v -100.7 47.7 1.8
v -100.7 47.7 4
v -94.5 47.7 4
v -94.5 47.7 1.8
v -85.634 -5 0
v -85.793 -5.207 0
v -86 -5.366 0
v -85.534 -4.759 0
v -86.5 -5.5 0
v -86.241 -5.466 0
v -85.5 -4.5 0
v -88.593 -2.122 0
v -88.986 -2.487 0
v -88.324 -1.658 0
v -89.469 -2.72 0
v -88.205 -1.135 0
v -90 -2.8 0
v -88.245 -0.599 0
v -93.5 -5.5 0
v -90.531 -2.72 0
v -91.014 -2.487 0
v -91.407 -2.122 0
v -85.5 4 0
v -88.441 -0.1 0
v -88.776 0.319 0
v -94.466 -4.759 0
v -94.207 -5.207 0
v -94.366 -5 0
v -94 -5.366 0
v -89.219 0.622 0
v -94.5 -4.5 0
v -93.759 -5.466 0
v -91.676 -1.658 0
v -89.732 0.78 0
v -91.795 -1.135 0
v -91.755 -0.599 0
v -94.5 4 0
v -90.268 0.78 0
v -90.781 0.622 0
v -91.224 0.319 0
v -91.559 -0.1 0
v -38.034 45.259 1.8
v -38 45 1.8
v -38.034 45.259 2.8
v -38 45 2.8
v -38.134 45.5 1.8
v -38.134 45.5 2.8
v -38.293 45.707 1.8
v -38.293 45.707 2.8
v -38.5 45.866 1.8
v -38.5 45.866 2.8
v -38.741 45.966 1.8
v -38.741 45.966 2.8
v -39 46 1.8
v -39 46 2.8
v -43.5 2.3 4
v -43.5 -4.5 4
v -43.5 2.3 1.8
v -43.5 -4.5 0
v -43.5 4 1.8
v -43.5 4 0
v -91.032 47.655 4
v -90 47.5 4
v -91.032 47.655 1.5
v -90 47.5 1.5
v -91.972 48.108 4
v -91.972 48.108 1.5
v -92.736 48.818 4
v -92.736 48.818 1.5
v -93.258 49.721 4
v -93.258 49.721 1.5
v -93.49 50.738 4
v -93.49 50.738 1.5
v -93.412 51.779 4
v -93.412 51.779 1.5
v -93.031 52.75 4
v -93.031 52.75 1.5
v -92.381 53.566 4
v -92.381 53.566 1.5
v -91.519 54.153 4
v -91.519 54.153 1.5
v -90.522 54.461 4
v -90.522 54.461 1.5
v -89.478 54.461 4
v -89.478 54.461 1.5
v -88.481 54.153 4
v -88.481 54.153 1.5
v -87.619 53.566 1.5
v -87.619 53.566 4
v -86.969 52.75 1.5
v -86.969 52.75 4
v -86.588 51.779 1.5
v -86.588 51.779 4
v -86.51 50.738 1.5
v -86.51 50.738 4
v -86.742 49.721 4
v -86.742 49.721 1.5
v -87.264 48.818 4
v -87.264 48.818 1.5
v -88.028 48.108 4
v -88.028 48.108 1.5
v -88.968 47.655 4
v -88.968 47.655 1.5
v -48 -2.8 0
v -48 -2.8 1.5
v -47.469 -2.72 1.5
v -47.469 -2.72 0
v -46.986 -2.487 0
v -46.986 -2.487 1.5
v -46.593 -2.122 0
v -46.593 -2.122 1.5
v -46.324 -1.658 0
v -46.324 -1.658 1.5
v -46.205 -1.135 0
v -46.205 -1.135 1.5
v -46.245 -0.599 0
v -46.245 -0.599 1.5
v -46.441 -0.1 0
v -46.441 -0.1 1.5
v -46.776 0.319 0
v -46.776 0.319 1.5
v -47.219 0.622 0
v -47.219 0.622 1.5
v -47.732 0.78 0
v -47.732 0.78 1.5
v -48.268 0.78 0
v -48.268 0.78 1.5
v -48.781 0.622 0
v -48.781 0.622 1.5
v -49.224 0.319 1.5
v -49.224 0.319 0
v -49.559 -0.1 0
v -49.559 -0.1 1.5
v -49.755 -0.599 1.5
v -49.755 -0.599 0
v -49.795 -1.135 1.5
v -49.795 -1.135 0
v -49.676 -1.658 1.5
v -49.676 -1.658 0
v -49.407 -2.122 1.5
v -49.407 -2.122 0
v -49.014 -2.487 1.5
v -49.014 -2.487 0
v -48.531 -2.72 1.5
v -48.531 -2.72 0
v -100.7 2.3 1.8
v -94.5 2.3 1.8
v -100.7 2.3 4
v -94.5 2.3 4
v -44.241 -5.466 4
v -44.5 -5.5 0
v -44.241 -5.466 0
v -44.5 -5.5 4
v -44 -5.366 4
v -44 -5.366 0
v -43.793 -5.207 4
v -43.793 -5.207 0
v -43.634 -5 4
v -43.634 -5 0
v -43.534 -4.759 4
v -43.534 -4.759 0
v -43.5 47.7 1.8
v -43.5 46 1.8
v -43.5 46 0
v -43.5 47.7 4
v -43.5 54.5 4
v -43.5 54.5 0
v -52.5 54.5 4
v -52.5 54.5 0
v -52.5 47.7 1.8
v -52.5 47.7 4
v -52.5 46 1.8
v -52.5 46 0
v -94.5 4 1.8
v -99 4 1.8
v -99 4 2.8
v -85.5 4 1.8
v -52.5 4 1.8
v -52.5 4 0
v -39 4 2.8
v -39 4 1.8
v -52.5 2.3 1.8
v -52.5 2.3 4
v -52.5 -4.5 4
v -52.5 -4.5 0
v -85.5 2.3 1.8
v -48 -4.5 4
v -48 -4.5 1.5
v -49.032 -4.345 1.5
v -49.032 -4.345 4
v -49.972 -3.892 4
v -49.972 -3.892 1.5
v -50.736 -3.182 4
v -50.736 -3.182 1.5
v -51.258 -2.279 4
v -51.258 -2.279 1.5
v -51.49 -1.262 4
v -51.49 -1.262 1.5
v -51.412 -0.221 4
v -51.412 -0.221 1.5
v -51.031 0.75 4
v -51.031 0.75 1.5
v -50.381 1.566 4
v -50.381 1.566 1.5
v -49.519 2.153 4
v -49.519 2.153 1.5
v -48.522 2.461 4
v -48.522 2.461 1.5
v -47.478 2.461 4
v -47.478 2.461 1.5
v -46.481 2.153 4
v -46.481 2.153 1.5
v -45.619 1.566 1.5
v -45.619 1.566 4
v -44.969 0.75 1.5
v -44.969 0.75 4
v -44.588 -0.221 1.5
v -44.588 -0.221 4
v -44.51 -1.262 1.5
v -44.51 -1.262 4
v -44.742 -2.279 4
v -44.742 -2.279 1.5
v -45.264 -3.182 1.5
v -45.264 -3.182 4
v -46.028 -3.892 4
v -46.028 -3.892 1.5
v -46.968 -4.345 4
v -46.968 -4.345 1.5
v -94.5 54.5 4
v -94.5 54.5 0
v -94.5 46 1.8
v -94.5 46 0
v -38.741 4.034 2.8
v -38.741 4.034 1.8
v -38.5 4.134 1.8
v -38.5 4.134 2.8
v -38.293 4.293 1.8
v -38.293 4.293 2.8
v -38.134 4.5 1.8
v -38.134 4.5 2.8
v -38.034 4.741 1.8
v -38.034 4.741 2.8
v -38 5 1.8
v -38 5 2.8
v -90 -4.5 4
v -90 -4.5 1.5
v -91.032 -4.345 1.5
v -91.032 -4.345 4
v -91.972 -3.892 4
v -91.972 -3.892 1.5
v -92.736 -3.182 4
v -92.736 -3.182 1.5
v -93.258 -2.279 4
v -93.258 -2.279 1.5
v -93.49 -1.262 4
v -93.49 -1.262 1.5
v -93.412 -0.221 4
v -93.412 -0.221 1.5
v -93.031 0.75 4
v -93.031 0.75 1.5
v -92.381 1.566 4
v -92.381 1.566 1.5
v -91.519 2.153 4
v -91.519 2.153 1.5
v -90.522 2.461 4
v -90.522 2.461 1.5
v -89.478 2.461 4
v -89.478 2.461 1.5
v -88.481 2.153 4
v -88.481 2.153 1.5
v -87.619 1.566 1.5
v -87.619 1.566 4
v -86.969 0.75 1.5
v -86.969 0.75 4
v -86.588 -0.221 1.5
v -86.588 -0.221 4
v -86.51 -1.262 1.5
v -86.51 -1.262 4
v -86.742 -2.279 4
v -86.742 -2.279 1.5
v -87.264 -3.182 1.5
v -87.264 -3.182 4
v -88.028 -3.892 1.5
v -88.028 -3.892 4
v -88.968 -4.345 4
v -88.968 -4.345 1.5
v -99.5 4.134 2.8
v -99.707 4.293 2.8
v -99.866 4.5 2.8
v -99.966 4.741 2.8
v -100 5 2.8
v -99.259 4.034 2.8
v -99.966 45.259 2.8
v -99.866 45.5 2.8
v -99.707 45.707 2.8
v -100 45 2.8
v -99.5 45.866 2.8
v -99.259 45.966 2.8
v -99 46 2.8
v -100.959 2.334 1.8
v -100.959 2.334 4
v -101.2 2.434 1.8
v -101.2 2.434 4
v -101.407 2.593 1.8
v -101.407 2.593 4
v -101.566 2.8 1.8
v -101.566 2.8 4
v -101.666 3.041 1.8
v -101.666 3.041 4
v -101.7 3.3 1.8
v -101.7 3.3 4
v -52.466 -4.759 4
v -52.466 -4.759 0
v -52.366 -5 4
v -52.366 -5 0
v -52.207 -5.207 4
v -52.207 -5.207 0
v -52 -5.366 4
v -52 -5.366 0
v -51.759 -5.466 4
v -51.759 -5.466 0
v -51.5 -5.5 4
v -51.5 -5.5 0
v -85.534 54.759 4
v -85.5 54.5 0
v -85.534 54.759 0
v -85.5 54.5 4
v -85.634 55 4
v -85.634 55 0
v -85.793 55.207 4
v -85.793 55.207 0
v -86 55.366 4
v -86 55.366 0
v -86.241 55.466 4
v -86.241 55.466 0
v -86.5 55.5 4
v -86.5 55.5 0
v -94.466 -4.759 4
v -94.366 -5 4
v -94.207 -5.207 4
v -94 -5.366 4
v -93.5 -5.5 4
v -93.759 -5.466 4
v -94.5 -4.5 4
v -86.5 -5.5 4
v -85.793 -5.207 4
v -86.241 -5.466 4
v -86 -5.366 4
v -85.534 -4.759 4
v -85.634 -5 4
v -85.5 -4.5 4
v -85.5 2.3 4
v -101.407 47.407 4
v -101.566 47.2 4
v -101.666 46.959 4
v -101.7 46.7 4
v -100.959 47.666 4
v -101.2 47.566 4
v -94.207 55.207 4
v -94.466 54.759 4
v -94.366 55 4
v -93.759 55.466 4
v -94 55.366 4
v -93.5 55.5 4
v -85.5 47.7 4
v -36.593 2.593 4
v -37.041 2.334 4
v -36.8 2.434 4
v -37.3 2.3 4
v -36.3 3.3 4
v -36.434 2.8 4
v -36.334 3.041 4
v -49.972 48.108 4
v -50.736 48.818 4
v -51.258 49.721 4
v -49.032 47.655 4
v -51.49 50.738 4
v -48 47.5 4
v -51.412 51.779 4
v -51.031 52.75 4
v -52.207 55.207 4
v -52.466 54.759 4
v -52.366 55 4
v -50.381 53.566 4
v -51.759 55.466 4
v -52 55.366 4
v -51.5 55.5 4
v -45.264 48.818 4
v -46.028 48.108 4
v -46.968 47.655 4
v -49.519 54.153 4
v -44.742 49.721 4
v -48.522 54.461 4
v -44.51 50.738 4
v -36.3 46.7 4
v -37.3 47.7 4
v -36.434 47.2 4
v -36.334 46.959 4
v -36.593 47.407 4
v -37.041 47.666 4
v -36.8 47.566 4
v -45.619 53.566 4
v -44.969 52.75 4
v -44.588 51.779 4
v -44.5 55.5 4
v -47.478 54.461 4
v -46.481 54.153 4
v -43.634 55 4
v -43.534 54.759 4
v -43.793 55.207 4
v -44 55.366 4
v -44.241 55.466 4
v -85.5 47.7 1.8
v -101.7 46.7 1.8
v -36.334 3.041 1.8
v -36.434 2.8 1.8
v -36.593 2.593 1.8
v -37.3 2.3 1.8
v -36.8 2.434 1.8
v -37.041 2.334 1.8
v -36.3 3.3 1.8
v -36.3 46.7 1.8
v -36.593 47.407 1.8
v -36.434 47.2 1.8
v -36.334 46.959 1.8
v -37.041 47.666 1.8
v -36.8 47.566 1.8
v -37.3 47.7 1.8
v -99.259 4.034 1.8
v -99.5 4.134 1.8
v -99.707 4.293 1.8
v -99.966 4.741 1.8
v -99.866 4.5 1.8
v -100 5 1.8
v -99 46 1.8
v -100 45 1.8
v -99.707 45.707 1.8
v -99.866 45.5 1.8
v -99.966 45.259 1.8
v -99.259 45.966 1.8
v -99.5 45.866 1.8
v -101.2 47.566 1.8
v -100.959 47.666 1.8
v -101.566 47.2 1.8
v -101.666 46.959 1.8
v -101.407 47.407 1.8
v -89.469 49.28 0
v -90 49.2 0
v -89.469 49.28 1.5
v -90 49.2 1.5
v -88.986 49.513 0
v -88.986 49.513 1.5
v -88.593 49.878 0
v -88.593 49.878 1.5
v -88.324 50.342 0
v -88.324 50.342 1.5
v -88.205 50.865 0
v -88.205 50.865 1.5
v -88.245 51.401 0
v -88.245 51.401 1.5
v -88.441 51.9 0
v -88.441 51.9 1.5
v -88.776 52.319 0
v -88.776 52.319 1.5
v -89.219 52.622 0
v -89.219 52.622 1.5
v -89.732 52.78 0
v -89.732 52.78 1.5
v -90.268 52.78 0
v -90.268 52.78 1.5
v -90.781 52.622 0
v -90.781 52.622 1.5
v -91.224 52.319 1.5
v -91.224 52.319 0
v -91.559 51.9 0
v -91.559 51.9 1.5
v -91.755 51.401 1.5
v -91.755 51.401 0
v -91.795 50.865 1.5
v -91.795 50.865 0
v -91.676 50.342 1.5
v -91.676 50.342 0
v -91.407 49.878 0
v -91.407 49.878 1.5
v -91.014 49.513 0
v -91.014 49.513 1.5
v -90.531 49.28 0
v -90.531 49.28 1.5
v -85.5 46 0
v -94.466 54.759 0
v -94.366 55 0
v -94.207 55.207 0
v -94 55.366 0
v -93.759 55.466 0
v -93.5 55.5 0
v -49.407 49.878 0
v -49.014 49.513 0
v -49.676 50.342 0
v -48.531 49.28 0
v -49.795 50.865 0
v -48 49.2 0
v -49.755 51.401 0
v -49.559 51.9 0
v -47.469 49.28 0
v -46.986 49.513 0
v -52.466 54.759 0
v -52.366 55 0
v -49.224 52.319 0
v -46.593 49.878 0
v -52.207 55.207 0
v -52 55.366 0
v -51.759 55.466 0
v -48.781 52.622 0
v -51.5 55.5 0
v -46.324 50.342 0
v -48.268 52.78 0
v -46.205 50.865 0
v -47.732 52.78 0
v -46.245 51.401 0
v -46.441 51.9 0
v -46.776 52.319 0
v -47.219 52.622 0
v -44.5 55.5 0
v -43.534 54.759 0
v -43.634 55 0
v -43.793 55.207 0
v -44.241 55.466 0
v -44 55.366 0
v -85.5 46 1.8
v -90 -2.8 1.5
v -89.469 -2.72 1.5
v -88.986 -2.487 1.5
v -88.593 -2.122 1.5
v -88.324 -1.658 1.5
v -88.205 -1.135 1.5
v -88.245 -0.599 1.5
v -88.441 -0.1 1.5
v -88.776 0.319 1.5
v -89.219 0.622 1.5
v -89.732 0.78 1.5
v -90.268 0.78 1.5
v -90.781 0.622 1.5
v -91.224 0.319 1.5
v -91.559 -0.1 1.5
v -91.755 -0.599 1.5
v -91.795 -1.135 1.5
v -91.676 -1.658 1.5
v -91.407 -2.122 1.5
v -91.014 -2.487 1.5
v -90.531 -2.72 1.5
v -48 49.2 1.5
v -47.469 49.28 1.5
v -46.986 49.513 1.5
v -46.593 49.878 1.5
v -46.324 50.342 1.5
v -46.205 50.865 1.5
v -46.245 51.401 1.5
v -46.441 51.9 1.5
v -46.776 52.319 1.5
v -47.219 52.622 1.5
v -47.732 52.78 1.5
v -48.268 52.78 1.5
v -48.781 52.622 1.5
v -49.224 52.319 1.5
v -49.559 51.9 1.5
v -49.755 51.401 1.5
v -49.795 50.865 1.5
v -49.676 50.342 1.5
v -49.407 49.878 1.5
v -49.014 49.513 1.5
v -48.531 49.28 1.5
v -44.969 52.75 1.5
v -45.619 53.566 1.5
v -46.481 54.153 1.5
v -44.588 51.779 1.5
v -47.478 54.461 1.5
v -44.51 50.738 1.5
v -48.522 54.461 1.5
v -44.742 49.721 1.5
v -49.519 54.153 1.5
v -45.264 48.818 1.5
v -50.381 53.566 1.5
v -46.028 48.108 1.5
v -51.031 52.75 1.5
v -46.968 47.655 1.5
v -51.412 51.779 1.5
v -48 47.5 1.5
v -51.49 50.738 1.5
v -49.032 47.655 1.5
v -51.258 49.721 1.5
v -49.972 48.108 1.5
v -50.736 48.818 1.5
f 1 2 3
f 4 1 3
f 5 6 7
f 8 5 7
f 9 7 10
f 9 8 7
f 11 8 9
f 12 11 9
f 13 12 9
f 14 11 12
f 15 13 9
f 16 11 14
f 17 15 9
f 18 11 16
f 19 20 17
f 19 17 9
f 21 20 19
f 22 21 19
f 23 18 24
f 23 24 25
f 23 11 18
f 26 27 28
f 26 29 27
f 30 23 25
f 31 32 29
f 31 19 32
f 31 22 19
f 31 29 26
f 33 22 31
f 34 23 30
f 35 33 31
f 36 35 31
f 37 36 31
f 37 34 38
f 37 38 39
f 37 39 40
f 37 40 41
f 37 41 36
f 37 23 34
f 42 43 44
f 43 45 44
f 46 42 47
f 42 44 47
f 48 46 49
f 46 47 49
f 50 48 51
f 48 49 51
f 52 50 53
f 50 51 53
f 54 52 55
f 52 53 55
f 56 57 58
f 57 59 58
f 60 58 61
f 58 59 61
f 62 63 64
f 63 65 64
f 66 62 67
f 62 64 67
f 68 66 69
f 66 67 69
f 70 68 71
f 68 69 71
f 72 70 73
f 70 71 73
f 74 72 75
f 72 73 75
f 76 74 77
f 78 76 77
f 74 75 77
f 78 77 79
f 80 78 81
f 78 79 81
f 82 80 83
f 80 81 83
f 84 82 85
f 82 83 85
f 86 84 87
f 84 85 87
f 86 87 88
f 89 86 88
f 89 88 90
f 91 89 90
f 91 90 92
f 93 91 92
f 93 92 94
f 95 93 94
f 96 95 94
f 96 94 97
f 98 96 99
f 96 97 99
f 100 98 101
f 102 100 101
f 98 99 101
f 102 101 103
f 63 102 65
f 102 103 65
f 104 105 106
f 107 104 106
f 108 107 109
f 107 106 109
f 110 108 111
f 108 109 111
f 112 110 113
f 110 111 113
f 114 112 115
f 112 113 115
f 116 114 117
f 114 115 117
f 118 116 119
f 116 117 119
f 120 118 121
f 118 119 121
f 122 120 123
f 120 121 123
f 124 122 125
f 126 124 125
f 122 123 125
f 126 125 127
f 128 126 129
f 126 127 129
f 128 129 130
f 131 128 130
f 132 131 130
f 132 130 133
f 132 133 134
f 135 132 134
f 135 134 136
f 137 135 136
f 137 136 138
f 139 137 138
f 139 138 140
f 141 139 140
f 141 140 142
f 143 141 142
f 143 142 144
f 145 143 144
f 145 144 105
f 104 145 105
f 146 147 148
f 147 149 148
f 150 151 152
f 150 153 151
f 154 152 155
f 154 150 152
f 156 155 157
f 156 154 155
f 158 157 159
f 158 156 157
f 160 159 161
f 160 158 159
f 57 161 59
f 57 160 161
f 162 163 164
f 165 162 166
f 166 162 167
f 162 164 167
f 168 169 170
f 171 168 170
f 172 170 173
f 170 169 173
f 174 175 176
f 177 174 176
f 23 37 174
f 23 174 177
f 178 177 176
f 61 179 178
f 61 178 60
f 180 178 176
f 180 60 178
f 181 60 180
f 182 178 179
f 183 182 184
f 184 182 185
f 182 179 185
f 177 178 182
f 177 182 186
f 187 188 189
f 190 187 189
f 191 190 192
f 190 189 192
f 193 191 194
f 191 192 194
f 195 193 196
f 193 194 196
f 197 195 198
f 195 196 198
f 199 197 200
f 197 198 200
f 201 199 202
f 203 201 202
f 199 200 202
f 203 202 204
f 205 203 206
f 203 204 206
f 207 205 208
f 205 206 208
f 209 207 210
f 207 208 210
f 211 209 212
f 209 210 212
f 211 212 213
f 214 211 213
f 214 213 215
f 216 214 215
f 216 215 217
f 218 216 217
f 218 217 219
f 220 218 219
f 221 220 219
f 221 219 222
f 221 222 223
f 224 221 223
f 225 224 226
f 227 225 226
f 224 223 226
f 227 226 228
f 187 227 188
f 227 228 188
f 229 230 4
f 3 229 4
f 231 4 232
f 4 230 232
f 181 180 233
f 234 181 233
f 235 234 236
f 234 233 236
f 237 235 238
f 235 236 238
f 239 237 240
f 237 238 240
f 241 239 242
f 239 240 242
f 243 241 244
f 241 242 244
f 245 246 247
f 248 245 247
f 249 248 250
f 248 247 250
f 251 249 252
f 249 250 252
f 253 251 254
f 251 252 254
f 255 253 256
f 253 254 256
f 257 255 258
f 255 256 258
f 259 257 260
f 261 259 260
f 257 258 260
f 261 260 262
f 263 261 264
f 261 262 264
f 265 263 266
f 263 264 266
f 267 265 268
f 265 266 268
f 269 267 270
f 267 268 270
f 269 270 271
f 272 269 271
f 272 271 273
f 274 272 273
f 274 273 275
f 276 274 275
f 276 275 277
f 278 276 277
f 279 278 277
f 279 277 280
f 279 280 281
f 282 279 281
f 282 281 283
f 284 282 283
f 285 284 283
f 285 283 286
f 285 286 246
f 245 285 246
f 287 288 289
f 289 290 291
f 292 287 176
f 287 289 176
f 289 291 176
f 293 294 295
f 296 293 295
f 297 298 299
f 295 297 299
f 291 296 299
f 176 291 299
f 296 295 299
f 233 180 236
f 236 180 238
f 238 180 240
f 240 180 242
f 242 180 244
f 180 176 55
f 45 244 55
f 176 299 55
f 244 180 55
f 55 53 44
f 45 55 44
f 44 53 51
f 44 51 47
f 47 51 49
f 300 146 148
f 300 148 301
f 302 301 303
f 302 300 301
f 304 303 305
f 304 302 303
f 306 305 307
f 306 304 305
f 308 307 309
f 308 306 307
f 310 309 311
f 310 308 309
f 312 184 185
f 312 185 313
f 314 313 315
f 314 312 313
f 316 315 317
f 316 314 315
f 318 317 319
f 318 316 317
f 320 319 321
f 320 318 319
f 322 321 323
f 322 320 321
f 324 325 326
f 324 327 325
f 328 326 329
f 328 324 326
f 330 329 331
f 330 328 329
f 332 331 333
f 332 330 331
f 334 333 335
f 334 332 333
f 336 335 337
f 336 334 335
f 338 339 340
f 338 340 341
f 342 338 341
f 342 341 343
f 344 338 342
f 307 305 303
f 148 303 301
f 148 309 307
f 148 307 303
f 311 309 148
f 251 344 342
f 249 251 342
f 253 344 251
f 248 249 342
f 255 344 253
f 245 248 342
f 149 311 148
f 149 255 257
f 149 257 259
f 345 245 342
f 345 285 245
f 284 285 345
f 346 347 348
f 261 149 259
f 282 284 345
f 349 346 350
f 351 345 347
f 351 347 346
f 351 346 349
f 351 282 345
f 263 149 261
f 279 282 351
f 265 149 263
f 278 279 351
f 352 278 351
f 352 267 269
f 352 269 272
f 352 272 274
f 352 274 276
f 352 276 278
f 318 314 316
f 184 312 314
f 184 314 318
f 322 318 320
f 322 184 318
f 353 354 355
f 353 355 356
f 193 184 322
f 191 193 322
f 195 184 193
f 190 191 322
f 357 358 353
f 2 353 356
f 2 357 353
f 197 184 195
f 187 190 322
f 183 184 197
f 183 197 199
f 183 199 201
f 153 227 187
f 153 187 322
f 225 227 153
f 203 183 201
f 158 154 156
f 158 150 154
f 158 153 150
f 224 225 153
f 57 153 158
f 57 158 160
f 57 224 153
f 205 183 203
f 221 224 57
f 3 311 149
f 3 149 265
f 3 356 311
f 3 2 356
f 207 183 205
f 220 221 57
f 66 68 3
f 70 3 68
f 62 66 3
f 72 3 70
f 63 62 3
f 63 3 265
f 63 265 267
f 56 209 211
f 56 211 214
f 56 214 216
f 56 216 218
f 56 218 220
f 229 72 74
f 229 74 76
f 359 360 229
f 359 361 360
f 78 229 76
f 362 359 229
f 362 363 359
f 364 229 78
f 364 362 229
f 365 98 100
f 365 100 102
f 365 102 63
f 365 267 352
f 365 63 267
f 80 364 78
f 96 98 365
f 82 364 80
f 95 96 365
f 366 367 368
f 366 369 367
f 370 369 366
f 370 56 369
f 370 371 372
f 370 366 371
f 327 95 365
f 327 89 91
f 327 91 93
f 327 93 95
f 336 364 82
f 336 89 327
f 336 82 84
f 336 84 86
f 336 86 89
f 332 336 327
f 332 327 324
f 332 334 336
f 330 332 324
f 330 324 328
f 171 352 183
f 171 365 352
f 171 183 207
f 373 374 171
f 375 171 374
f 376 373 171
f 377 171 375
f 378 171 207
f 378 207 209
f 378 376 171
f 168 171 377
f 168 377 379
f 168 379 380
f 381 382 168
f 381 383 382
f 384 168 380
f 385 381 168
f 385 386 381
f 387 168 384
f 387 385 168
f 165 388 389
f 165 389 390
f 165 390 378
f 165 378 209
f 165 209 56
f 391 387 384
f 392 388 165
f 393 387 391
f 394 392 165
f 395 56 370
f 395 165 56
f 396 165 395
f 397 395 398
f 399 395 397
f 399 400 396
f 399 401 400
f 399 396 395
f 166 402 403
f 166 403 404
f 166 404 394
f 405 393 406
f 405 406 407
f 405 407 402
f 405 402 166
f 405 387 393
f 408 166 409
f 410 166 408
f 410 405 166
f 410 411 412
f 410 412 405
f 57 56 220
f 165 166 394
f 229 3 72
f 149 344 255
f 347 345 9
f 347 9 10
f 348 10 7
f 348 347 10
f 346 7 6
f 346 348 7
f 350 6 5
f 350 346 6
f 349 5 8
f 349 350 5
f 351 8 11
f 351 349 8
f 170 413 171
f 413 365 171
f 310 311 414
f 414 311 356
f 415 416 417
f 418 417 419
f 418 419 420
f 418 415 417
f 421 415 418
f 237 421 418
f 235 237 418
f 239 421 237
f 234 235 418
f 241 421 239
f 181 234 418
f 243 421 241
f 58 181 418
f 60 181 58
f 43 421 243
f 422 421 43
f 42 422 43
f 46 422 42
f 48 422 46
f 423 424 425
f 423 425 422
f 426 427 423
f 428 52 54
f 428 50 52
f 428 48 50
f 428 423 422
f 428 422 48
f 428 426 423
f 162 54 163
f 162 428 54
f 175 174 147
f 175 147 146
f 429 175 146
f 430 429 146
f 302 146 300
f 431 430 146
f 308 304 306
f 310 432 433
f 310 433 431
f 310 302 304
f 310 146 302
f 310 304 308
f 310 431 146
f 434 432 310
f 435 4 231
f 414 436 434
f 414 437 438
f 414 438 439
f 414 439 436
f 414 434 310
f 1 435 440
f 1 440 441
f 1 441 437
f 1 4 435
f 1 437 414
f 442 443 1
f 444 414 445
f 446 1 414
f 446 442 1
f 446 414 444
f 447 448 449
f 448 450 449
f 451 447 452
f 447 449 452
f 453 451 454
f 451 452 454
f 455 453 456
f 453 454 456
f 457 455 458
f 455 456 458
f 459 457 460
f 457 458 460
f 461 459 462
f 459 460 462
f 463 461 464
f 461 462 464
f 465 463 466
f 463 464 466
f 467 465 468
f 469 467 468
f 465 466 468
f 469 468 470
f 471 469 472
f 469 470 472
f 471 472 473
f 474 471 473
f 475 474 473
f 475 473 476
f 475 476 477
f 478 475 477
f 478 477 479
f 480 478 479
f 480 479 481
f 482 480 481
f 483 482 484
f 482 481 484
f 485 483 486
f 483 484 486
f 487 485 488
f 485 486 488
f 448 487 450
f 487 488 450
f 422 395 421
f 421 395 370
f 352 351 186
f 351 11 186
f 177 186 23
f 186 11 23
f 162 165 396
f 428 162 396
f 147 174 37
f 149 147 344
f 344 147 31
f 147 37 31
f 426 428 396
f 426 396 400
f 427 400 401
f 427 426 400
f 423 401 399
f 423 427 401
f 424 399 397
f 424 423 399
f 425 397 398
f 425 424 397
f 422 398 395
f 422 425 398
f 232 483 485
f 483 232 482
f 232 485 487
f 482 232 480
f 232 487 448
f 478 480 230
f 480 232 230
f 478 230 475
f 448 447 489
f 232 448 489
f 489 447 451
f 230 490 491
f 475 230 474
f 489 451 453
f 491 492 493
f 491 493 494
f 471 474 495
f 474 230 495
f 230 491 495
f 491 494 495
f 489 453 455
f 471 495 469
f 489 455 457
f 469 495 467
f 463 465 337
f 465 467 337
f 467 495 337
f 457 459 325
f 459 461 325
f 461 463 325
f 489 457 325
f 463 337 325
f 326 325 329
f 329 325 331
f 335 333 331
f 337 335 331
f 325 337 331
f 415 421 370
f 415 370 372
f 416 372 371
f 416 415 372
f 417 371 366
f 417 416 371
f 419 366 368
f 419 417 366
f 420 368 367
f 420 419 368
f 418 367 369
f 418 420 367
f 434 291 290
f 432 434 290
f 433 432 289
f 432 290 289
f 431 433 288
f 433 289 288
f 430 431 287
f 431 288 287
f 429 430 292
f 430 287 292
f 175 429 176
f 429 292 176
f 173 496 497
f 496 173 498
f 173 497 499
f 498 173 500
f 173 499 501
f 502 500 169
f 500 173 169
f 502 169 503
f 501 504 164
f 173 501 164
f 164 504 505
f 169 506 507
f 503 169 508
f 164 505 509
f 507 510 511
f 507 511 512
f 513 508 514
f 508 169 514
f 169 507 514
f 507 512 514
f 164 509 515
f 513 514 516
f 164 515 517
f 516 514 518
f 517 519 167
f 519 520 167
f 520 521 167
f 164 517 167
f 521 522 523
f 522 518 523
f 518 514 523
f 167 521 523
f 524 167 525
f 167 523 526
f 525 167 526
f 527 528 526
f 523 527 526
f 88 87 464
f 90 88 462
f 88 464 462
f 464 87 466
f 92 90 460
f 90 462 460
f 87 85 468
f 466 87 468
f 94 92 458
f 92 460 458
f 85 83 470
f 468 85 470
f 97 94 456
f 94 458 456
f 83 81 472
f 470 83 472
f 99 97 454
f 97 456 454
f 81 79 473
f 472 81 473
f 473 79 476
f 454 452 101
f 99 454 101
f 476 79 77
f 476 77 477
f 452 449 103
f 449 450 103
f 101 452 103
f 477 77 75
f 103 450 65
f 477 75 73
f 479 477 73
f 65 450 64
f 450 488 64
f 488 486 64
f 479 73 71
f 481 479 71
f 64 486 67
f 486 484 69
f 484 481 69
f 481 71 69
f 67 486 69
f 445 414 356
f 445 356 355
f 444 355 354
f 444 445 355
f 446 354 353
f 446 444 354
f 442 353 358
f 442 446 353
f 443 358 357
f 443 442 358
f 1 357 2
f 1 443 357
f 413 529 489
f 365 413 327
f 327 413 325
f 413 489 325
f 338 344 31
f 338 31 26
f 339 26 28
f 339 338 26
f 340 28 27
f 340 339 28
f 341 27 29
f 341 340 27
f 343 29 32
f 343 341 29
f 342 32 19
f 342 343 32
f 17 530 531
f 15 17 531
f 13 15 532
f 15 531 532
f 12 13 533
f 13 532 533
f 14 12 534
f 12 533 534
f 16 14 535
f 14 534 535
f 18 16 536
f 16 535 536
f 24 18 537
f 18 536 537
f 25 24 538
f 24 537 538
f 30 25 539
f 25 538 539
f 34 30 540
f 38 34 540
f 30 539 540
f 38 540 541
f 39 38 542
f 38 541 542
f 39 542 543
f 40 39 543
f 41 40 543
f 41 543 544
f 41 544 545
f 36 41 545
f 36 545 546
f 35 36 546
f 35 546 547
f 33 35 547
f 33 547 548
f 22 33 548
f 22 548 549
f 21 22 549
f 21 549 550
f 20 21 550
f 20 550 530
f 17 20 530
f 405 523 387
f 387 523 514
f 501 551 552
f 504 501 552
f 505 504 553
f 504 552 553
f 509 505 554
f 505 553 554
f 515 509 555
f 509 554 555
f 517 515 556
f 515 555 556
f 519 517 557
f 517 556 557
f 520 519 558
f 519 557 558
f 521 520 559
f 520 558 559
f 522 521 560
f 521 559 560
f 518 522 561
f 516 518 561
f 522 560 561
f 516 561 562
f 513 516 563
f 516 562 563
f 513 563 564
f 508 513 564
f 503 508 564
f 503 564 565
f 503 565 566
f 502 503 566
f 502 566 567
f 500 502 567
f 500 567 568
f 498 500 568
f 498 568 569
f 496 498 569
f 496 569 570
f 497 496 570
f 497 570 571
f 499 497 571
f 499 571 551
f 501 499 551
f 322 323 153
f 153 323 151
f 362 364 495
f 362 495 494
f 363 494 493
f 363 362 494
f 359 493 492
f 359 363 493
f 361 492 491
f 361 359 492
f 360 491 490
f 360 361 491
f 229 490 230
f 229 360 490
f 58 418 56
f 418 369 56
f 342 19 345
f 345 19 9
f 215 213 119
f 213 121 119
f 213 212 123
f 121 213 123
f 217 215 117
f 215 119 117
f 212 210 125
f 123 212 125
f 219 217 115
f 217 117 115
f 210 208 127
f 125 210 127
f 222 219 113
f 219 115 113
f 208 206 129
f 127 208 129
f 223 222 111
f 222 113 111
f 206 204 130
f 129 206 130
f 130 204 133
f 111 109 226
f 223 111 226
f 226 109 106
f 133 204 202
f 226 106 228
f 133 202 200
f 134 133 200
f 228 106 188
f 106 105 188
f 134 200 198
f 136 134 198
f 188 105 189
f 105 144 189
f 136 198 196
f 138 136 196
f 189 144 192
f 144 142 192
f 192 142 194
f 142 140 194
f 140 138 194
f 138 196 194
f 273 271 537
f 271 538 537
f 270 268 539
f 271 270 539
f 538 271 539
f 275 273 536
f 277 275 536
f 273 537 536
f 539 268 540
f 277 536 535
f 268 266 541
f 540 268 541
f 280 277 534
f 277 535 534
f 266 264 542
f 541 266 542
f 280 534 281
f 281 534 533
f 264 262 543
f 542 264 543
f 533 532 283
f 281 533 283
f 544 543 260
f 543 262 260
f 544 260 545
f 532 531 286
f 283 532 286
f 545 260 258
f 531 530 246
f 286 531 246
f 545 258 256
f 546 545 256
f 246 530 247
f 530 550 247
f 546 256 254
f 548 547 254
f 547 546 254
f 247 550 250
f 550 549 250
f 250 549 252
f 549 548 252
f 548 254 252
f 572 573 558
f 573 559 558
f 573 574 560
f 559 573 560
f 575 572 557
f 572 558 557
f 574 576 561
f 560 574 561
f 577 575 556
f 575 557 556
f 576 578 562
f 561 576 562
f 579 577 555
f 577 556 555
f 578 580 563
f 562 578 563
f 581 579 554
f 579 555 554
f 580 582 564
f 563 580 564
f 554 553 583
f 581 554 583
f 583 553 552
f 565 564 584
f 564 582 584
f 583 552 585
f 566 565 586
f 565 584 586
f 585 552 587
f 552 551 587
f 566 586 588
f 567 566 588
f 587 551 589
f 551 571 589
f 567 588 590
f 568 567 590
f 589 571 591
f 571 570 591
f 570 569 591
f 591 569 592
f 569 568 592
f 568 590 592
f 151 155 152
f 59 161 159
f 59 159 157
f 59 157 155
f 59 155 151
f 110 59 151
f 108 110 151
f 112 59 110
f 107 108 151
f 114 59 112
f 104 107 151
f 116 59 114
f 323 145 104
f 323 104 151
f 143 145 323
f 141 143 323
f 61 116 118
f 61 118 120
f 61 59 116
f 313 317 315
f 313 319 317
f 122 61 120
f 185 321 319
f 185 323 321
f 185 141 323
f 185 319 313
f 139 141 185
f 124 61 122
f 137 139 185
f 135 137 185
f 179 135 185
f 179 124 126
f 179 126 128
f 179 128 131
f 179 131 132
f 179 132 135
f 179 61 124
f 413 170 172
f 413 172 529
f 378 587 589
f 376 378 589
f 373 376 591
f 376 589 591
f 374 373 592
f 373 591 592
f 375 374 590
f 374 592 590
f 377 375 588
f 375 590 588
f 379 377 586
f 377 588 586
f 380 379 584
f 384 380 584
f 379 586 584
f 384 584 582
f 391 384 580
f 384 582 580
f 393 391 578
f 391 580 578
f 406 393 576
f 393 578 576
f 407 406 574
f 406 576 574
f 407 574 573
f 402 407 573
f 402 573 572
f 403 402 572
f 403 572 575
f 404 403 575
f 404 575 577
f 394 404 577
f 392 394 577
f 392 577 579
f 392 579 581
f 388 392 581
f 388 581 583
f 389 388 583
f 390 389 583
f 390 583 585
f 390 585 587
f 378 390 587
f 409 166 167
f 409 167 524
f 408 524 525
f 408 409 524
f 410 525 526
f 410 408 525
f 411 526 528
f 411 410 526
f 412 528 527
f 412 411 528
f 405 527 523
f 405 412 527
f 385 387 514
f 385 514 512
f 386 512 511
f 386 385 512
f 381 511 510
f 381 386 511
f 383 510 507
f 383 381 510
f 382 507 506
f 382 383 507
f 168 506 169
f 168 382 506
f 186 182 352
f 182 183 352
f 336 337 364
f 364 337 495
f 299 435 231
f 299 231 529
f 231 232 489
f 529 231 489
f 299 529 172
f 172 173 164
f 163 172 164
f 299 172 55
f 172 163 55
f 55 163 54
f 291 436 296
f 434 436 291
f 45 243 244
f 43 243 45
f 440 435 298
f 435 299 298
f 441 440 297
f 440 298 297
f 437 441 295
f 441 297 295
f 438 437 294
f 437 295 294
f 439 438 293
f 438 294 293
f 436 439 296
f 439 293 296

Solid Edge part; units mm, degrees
sketch "Sketch1" plane through (0, 0, 0) normal (0, 0, 1) x (1, 0, 0)
  line L0 (-94.5, 46) -> (-85.5, 46)
  line L1 (-85.5, 46) -> (-85.5, 55.5)
  line L2 (-85.5, 55.5) -> (-94.5, 55.5)
  line L3 (-94.5, 55.5) -> (-94.5, 46)
  line L4 (-94.5, 4) -> (-85.5, 4)
  line L5 (-85.5, -5.5) -> (-85.5, 4)
  line L6 (-94.5, -5.5) -> (-85.5, -5.5)
  line L7 (-94.5, 4) -> (-94.5, -5.5)
  line L8 (-52.5, 4) -> (-43.5, 4)
  line L9 (-43.5, -5.5) -> (-43.5, 4)
  line L10 (-52.5, -5.5) -> (-43.5, -5.5)
  line L11 (-52.5, 4) -> (-52.5, -5.5)
  line L12 (-52.5, 46) -> (-43.5, 46)
  line L13 (-43.5, 46) -> (-43.5, 55.5)
  line L14 (-43.5, 55.5) -> (-52.5, 55.5)
  line L15 (-52.5, 55.5) -> (-52.5, 46)
  dimension "D1" = 0.5
extrude "Protrusion1" add sketch "Sketch1" along normal blind 4
sketch "Sketch2" plane through (-97, -4.7, 4) normal (0, 0, 1) x (1, 0, 0)
  line L0 (-4.7, 52.4) -> (60.7, 52.4)
  line L1 (60.7, 52.4) -> (60.7, 7)
  line L2 (60.7, 7) -> (-4.7, 7)
  line L3 (-4.7, 7) -> (-4.7, 52.4)
extrude "ExtrudedProtrusion_2" add sketch "Sketch2" against normal blind 2.2
sketch "Sketch3" plane through (-61.5, 21.5, 1.8) normal (0, 0, -1) x (0, -1, 0)
  line L0 (17.5, -21.7) -> (17.5, -23.5)
  line L1 (17.5, -23.5) -> (-24.5, -23.5)
  line L2 (-24.5, -23.5) -> (-24.5, 38.5)
  line L3 (-24.5, 38.5) -> (17.5, 38.5)
  line L4 (17.5, 38.5) -> (17.5, 36.7)
  line L5 (17.5, 36.7) -> (17.5, 20.3)
  line L6 (17.5, 20.3) -> (17.5, -5.3)
  line L7 (17.5, -5.3) -> (17.5, -21.7)
extrude "ExtrudedCutout_1" cut sketch "Sketch3" against normal blind 1
hole "Hole_1" at (-90, 51, 4) direction (0, 0, -1) diameter 3.6 end up to next counterbore diameter 7 counterbore depth 2.5
hole "Hole1" at (-48, 51, 4) direction (0, 0, -1) diameter 3.6 end up to next counterbore diameter 7 counterbore depth 2.5
hole "Hole2" at (-48, -1, 4) direction (0, 0, -1) diameter 3.6 end up to next counterbore diameter 7 counterbore depth 2.5
hole "Hole3" at (-90, -1, 4) direction (0, 0, -1) diameter 3.6 end up to next counterbore diameter 7 counterbore depth 2.5
fillet "Round_1" radius 1 16 edges at (-36.3, 2.3, 2.9) (-36.3, 47.7, 2.9) (-101.7, 2.3, 2.9) (-101.7, 47.7, 2.9) (-43.5, -5.5, 2) (-52.5, -5.5, 2) (-94.5, -5.5, 2) (-85.5, -5.5, 2) (-85.5, 55.5, 2) (-94.5, 55.5, 2) (-52.5, 55.5, 2) (-43.5, 55.5, 2) (-38, 4, 2.3) (-100, 4, 2.3) (-38, 46, 2.3) (-100, 46, 2.3)
